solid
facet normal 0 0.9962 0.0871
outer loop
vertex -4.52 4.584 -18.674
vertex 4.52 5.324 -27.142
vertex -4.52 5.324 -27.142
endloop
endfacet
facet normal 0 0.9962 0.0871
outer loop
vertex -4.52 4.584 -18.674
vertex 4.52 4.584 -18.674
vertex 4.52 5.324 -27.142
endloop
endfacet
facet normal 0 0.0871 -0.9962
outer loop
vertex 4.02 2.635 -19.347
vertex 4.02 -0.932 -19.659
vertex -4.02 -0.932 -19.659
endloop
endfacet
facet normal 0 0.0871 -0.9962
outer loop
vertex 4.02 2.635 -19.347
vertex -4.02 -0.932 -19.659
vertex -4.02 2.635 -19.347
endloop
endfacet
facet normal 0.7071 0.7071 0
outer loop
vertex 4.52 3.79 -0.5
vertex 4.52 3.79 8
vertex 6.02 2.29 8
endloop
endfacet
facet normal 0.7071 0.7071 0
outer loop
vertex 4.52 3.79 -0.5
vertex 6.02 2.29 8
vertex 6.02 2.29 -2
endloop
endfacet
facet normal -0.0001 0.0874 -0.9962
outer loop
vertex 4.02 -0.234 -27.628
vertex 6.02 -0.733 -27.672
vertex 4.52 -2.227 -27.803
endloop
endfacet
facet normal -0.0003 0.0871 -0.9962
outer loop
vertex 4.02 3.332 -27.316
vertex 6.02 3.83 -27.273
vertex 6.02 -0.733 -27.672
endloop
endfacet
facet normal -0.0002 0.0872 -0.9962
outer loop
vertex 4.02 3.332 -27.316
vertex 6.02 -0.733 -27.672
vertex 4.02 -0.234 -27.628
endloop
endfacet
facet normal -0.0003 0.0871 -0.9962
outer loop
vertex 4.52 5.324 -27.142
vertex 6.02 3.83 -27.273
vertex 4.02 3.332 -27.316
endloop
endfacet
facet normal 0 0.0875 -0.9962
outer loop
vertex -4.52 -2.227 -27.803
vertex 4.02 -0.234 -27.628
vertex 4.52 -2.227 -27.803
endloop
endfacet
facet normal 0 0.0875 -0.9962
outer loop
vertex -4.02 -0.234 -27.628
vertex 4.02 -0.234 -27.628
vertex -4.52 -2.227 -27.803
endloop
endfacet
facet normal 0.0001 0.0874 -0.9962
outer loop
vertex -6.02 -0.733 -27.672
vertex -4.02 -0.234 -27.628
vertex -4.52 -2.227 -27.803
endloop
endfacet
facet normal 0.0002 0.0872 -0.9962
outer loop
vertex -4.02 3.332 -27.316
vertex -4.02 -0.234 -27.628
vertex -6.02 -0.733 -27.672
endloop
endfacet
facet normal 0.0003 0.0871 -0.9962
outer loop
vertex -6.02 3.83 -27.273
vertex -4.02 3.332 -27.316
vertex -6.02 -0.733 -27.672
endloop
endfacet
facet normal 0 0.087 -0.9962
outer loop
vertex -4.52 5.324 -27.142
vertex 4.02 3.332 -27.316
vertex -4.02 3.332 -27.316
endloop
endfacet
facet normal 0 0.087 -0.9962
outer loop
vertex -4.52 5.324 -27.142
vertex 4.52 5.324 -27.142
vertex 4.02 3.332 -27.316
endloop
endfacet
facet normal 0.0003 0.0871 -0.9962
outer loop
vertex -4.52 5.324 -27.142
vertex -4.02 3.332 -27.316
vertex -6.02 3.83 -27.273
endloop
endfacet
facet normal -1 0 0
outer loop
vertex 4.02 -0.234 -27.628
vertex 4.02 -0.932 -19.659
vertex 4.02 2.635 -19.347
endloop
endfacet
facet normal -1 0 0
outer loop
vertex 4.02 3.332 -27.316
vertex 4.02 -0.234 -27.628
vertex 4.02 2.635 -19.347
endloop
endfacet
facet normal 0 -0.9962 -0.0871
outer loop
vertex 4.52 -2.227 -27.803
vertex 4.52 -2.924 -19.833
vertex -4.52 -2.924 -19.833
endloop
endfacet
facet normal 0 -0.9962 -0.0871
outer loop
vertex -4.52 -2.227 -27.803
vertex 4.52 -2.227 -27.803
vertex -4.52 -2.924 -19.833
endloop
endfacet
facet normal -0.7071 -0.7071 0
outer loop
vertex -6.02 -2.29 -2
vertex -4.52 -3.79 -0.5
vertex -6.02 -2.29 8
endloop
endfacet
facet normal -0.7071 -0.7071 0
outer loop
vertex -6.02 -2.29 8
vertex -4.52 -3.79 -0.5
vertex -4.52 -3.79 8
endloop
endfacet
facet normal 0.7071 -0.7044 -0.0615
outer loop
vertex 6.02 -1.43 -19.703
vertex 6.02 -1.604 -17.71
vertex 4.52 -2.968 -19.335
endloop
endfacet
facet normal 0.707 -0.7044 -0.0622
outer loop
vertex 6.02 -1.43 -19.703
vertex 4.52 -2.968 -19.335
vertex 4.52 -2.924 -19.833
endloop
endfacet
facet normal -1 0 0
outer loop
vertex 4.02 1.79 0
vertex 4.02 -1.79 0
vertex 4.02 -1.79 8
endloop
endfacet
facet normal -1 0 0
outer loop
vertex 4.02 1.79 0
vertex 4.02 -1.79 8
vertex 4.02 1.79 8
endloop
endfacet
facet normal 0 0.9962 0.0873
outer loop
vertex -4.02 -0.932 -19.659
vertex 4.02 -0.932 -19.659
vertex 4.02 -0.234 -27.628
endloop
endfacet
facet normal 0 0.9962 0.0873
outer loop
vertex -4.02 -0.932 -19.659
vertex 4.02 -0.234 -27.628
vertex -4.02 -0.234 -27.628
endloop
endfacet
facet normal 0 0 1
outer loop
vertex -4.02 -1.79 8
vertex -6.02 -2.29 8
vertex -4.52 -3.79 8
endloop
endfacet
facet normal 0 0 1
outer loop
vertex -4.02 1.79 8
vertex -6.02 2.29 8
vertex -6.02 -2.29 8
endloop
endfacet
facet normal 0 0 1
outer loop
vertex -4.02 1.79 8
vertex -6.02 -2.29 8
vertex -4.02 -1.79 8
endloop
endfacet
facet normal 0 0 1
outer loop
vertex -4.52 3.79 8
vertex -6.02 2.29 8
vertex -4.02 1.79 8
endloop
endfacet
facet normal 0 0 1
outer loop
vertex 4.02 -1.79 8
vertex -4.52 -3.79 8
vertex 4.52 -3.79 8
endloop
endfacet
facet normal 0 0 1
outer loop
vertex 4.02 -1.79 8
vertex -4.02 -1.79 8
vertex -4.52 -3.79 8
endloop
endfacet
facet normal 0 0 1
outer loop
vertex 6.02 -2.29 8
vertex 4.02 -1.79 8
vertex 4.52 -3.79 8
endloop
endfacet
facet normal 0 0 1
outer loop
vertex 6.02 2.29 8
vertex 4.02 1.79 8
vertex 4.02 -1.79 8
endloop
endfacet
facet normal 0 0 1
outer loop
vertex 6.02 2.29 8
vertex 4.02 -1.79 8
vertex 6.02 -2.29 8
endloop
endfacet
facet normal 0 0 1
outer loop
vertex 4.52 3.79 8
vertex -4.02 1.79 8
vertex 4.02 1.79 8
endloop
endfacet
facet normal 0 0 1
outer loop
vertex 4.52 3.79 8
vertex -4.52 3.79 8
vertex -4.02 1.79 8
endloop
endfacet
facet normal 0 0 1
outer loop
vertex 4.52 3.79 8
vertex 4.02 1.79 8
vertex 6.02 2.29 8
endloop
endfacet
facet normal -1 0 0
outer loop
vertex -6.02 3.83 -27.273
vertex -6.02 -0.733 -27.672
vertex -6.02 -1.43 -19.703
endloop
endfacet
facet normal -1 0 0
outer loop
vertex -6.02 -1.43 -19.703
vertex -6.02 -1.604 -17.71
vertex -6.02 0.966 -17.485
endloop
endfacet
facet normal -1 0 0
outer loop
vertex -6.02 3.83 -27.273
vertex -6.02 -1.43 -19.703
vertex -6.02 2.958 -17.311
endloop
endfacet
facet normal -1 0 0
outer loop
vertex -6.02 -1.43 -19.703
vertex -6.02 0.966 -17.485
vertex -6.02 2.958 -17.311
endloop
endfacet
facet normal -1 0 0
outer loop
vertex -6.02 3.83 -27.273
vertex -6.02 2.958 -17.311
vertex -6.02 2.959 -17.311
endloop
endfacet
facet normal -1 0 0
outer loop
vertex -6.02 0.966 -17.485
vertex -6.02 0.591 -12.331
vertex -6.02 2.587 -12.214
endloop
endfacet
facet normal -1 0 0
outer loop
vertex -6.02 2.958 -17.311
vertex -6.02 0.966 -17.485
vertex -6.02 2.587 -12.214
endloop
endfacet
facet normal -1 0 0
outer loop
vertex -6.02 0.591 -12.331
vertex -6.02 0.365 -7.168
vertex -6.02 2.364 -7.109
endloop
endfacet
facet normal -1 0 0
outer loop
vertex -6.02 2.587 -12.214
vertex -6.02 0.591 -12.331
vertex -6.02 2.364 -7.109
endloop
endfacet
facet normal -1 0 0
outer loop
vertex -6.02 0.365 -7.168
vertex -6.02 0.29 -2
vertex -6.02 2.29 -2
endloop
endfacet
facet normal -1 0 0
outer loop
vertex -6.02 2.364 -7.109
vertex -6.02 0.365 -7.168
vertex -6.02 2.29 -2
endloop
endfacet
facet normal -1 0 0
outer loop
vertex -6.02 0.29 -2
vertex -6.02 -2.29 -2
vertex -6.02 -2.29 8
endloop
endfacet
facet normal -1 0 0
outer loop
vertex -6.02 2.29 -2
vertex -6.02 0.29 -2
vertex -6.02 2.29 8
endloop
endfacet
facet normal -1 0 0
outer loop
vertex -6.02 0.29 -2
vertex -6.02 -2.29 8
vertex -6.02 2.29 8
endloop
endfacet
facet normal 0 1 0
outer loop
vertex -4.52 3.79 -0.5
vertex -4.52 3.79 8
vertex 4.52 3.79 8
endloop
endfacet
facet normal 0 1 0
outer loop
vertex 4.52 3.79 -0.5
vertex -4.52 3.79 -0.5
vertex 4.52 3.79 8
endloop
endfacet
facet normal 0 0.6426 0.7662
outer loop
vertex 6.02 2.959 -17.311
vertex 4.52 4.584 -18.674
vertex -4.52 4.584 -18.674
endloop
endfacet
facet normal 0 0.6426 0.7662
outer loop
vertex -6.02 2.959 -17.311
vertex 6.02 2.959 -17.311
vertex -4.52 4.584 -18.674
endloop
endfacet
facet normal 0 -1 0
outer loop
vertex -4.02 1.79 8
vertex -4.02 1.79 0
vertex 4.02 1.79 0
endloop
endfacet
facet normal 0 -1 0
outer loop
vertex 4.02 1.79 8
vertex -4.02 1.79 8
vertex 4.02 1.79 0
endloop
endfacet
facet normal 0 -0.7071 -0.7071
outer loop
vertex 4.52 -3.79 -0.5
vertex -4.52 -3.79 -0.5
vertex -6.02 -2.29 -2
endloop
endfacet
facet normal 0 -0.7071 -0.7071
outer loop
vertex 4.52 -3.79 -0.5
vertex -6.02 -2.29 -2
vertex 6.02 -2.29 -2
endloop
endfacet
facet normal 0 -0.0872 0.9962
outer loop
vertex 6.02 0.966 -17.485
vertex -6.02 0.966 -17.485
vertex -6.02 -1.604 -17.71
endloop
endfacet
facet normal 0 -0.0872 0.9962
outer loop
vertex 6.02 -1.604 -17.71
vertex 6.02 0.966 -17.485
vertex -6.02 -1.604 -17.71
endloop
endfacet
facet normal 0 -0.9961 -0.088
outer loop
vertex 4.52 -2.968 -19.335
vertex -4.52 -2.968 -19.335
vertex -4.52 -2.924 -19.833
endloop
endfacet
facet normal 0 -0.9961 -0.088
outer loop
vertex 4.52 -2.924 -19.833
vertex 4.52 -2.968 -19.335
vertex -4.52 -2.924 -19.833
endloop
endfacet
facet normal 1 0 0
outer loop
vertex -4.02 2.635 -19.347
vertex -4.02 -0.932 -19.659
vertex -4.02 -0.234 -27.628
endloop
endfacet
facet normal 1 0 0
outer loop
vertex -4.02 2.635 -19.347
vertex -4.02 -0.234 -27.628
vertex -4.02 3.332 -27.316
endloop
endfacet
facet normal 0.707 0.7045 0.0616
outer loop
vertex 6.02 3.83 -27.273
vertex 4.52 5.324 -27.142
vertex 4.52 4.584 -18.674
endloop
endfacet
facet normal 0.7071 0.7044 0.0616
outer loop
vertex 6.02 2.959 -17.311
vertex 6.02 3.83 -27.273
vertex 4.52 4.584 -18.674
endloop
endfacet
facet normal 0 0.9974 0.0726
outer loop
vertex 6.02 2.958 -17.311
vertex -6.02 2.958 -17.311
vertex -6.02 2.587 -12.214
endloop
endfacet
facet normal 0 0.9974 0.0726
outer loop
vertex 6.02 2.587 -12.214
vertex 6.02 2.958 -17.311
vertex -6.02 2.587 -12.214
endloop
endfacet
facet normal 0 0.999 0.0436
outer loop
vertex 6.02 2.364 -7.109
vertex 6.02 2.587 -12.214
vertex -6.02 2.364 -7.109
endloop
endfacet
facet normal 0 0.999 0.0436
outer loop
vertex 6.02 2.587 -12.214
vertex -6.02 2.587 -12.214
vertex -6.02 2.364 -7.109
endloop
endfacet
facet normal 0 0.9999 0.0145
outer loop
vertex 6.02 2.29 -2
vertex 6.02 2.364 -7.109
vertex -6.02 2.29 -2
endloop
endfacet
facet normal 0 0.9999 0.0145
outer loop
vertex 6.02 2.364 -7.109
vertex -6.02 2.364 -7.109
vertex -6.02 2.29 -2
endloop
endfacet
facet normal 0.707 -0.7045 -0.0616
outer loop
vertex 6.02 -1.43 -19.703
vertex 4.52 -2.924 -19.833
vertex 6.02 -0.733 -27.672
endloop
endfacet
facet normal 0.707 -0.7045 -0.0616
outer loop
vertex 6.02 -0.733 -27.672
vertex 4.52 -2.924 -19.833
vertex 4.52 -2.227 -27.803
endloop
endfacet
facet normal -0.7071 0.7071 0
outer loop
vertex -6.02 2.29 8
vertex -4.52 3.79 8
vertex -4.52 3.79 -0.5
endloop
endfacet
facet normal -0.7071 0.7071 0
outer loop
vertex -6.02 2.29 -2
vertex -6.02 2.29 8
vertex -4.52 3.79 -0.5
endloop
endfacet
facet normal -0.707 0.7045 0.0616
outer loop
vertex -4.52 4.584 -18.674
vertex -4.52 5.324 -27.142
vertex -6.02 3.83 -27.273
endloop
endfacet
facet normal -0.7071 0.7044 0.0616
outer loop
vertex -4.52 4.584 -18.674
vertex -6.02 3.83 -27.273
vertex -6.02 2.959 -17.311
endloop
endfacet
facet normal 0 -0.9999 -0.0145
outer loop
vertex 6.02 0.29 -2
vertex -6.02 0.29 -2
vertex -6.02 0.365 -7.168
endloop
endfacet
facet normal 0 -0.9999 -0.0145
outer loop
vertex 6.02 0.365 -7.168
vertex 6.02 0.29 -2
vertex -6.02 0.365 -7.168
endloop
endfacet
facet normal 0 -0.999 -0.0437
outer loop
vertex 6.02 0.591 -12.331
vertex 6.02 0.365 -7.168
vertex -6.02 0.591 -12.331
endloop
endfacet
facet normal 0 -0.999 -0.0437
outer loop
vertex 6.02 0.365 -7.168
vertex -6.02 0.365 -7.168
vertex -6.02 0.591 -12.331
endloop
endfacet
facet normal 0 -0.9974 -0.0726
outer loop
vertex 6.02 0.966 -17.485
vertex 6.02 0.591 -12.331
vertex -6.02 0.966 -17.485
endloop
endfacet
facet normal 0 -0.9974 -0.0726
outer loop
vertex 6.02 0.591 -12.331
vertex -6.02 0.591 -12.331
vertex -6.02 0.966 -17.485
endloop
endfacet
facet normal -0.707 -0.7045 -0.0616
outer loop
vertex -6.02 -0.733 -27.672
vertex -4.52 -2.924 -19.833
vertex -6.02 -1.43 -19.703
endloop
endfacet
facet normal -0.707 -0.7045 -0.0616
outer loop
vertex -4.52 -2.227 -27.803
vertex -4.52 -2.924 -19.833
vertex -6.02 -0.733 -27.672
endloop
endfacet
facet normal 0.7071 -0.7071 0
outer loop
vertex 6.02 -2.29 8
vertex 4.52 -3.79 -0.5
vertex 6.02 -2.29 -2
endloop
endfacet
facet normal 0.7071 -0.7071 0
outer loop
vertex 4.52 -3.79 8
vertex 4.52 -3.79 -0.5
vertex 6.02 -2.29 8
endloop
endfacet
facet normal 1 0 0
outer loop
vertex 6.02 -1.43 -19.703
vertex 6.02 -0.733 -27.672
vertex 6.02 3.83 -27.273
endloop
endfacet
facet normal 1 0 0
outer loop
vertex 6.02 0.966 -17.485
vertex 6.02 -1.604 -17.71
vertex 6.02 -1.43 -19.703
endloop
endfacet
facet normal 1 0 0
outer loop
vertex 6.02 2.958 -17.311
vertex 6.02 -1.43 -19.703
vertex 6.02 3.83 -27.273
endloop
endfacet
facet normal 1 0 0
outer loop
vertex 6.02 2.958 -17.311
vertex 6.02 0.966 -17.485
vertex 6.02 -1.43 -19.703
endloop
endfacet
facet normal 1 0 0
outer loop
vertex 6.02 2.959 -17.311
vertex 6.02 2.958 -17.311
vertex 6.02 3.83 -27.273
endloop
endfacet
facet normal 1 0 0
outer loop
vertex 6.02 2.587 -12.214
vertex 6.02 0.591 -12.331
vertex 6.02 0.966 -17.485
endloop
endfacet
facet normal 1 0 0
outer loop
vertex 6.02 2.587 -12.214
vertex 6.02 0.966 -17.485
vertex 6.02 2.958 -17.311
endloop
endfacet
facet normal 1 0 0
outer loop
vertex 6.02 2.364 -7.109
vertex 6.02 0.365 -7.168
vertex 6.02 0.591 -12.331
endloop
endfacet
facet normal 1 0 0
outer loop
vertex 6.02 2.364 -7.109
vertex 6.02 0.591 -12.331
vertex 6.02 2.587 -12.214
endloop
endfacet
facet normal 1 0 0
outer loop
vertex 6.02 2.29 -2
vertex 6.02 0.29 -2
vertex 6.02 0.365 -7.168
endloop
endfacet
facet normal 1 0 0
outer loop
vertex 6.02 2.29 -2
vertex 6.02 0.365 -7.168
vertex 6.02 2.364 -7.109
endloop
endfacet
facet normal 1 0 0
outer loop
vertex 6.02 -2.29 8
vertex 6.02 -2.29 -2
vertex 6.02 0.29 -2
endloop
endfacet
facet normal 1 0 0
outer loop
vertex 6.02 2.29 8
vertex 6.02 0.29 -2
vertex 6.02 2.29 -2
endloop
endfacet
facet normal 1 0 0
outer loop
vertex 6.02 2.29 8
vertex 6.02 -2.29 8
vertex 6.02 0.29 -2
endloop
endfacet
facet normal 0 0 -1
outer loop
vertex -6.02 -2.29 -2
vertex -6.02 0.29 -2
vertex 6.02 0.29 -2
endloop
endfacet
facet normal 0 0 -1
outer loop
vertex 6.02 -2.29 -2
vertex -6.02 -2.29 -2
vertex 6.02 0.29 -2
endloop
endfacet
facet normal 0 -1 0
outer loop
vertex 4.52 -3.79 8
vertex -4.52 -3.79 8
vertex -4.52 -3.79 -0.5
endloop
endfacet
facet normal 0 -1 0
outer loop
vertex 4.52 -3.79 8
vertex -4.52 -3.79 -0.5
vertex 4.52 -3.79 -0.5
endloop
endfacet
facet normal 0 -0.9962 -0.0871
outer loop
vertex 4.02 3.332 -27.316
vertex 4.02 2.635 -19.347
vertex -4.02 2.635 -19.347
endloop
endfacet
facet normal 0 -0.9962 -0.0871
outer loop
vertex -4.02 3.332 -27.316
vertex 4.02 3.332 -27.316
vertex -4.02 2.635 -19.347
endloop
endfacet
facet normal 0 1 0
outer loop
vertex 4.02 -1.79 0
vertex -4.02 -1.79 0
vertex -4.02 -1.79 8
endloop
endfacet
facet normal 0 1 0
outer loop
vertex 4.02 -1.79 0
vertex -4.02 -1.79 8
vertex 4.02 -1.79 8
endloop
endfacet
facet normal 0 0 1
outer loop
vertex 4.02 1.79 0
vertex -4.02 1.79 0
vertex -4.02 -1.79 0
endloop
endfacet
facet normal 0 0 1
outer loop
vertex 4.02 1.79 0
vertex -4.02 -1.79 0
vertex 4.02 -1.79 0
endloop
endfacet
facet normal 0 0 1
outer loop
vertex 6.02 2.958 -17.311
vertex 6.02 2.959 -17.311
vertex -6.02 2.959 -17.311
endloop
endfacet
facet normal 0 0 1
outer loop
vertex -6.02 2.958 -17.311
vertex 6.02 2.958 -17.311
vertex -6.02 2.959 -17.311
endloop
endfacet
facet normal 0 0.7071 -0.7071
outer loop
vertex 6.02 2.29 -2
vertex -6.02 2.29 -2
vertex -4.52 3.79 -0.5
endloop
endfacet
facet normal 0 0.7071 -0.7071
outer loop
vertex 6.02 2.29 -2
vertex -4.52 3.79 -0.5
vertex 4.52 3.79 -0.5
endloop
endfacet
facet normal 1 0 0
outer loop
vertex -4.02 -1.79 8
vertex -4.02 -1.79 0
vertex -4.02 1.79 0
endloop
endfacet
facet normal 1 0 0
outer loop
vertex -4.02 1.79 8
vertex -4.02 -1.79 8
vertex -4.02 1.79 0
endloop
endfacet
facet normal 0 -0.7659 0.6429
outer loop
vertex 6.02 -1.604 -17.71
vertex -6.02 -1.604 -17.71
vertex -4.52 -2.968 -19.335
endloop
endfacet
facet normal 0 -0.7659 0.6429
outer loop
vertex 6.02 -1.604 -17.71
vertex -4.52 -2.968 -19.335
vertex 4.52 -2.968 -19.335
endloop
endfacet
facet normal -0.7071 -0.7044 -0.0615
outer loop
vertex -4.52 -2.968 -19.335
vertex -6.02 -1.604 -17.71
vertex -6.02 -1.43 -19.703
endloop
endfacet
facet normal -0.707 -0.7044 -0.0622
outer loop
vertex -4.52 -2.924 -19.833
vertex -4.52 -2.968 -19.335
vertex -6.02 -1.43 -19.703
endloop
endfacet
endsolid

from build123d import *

# Parameters (mm, degrees)
SKETCH1_W           = 12.04
SKETCH1_H           = 7.58
SKETCH1_W_2         = 8.04
SKETCH1_H_2         = 3.58
BOSS_EXTRUDE1_DEPTH = 8
SKETCH1_2_W         = 12.04
SKETCH1_2_H         = 7.58
SKETCH1_2_W_2       = 8.04
SKETCH1_2_H_2       = 3.58
BOSS_EXTRUDE2_DEPTH = 2
EXTRUDE_THIN1_START = -12.04
EXTRUDE_THIN1_DEPTH = 12.04
SKETCH5_W           = 12.04
SKETCH5_H           = 7.58
SKETCH5_W_2         = 8.04
SKETCH5_H_2         = 3.58
BOSS_EXTRUDE4_DEPTH = 10
SKETCH5_4_W         = 12.04
SKETCH5_4_H         = 7.58
BOSS_EXTRUDE5_DEPTH = 2
CHAMFER1_SIZE       = 1.5


with BuildPart() as part:
    # Sketch1 → Boss-Extrude1 (new body)
    with BuildSketch(Plane.XY):
        Rectangle(SKETCH1_W, SKETCH1_H)
        Rectangle(SKETCH1_W_2, SKETCH1_H_2, mode=Mode.SUBTRACT)
    extrude(amount=BOSS_EXTRUDE1_DEPTH)

    # Sketch1<2> → Boss-Extrude2 (add)
    # profile 1 of 2: a face of its own
    with BuildSketch(Plane.XY):
        Rectangle(SKETCH1_2_W, SKETCH1_2_H)
        Rectangle(SKETCH1_2_W_2, SKETCH1_2_H_2, mode=Mode.SUBTRACT)
    # profile 2 of 2: a face of its own
    with BuildSketch(Plane.XY):
        Rectangle(SKETCH1_2_W_2, SKETCH1_2_H_2)
    extrude(amount=-BOSS_EXTRUDE2_DEPTH)

    # Sketch3 → Extrude-Thin1 (add)
    with BuildSketch(Plane(origin=(6.02, 9.81, 0), x_dir=(0, -1, 0), z_dir=(1, 0, 0)).offset(EXTRUDE_THIN1_START)):
        with BuildLine():
            Line((13.6, 2), (9.52, 2))
            ThreePointArc((9.52, 2), (9.350894106, 9.75), (8.843898328, 17.485247384))
            Line((8.843898328, 17.485247384), (12.908372696, 17.840842814))
            Line((12.908372696, 17.840842814), (12.734061211, 19.83323221))
            Line((12.734061211, 19.83323221), (6.665855308, 19.302332986))
            ThreePointArc((6.665855308, 19.302332986), (7.352797663, 9.662761226), (7.508614841, 0))
            Line((7.508614841, 0), (13.6, 0))
            Line((13.6, 0), (13.6, 2))
        make_face()
    extrude(amount=EXTRUDE_THIN1_DEPTH)

    # Sketch5 → Boss-Extrude4 (add)
    with BuildSketch(Plane(origin=(0, -2.22544681, -17.764471695), x_dir=(-1, 0, 0), z_dir=(0, 0.08715574274765182, -0.9961946980917462))):
        with Locations((0, 2.913739678)):
            Rectangle(SKETCH5_W, SKETCH5_H)
        with Locations((0, 2.913739678)):
            Rectangle(SKETCH5_W_2, SKETCH5_H_2, mode=Mode.SUBTRACT)
    extrude(amount=BOSS_EXTRUDE4_DEPTH)

    # Sketch5<4> → Boss-Extrude5 (add)
    with BuildSketch(Plane(origin=(0, -2.22544681, -17.764471695), x_dir=(-1, 0, 0), z_dir=(0, 0.08715574274765182, -0.9961946980917462))):
        with Locations((0, 2.913739678)):
            Rectangle(SKETCH5_4_W, SKETCH5_4_H)
    extrude(amount=BOSS_EXTRUDE5_DEPTH)

    # Chamfer1
    chamfer1_edges = [part.edges().sort_by_distance(p)[0] for p in [
        (0, -3.79, -2),
        (0, 3.79, -2),
        (-6.02, -2.662593983, -22.821816304),
        (6.02, -2.662593983, -22.821816304),
        (0, -3.098372696, -17.840842814),
        (6.02, -3.79, 3),
        (-6.02, -3.79, 3),
        (-6.02, 3.79, 3),
        (6.02, 3.79, 3),
        (0, 4.452783115, -17.180202284),
        (6.02, 4.888561829, -22.161175774),
        (-6.02, 4.888561829, -22.161175774),
    ]]
    chamfer(chamfer1_edges, length=CHAMFER1_SIZE - 0.0001)  # a hair under: the kernel refuses the full size


solid = part.part
